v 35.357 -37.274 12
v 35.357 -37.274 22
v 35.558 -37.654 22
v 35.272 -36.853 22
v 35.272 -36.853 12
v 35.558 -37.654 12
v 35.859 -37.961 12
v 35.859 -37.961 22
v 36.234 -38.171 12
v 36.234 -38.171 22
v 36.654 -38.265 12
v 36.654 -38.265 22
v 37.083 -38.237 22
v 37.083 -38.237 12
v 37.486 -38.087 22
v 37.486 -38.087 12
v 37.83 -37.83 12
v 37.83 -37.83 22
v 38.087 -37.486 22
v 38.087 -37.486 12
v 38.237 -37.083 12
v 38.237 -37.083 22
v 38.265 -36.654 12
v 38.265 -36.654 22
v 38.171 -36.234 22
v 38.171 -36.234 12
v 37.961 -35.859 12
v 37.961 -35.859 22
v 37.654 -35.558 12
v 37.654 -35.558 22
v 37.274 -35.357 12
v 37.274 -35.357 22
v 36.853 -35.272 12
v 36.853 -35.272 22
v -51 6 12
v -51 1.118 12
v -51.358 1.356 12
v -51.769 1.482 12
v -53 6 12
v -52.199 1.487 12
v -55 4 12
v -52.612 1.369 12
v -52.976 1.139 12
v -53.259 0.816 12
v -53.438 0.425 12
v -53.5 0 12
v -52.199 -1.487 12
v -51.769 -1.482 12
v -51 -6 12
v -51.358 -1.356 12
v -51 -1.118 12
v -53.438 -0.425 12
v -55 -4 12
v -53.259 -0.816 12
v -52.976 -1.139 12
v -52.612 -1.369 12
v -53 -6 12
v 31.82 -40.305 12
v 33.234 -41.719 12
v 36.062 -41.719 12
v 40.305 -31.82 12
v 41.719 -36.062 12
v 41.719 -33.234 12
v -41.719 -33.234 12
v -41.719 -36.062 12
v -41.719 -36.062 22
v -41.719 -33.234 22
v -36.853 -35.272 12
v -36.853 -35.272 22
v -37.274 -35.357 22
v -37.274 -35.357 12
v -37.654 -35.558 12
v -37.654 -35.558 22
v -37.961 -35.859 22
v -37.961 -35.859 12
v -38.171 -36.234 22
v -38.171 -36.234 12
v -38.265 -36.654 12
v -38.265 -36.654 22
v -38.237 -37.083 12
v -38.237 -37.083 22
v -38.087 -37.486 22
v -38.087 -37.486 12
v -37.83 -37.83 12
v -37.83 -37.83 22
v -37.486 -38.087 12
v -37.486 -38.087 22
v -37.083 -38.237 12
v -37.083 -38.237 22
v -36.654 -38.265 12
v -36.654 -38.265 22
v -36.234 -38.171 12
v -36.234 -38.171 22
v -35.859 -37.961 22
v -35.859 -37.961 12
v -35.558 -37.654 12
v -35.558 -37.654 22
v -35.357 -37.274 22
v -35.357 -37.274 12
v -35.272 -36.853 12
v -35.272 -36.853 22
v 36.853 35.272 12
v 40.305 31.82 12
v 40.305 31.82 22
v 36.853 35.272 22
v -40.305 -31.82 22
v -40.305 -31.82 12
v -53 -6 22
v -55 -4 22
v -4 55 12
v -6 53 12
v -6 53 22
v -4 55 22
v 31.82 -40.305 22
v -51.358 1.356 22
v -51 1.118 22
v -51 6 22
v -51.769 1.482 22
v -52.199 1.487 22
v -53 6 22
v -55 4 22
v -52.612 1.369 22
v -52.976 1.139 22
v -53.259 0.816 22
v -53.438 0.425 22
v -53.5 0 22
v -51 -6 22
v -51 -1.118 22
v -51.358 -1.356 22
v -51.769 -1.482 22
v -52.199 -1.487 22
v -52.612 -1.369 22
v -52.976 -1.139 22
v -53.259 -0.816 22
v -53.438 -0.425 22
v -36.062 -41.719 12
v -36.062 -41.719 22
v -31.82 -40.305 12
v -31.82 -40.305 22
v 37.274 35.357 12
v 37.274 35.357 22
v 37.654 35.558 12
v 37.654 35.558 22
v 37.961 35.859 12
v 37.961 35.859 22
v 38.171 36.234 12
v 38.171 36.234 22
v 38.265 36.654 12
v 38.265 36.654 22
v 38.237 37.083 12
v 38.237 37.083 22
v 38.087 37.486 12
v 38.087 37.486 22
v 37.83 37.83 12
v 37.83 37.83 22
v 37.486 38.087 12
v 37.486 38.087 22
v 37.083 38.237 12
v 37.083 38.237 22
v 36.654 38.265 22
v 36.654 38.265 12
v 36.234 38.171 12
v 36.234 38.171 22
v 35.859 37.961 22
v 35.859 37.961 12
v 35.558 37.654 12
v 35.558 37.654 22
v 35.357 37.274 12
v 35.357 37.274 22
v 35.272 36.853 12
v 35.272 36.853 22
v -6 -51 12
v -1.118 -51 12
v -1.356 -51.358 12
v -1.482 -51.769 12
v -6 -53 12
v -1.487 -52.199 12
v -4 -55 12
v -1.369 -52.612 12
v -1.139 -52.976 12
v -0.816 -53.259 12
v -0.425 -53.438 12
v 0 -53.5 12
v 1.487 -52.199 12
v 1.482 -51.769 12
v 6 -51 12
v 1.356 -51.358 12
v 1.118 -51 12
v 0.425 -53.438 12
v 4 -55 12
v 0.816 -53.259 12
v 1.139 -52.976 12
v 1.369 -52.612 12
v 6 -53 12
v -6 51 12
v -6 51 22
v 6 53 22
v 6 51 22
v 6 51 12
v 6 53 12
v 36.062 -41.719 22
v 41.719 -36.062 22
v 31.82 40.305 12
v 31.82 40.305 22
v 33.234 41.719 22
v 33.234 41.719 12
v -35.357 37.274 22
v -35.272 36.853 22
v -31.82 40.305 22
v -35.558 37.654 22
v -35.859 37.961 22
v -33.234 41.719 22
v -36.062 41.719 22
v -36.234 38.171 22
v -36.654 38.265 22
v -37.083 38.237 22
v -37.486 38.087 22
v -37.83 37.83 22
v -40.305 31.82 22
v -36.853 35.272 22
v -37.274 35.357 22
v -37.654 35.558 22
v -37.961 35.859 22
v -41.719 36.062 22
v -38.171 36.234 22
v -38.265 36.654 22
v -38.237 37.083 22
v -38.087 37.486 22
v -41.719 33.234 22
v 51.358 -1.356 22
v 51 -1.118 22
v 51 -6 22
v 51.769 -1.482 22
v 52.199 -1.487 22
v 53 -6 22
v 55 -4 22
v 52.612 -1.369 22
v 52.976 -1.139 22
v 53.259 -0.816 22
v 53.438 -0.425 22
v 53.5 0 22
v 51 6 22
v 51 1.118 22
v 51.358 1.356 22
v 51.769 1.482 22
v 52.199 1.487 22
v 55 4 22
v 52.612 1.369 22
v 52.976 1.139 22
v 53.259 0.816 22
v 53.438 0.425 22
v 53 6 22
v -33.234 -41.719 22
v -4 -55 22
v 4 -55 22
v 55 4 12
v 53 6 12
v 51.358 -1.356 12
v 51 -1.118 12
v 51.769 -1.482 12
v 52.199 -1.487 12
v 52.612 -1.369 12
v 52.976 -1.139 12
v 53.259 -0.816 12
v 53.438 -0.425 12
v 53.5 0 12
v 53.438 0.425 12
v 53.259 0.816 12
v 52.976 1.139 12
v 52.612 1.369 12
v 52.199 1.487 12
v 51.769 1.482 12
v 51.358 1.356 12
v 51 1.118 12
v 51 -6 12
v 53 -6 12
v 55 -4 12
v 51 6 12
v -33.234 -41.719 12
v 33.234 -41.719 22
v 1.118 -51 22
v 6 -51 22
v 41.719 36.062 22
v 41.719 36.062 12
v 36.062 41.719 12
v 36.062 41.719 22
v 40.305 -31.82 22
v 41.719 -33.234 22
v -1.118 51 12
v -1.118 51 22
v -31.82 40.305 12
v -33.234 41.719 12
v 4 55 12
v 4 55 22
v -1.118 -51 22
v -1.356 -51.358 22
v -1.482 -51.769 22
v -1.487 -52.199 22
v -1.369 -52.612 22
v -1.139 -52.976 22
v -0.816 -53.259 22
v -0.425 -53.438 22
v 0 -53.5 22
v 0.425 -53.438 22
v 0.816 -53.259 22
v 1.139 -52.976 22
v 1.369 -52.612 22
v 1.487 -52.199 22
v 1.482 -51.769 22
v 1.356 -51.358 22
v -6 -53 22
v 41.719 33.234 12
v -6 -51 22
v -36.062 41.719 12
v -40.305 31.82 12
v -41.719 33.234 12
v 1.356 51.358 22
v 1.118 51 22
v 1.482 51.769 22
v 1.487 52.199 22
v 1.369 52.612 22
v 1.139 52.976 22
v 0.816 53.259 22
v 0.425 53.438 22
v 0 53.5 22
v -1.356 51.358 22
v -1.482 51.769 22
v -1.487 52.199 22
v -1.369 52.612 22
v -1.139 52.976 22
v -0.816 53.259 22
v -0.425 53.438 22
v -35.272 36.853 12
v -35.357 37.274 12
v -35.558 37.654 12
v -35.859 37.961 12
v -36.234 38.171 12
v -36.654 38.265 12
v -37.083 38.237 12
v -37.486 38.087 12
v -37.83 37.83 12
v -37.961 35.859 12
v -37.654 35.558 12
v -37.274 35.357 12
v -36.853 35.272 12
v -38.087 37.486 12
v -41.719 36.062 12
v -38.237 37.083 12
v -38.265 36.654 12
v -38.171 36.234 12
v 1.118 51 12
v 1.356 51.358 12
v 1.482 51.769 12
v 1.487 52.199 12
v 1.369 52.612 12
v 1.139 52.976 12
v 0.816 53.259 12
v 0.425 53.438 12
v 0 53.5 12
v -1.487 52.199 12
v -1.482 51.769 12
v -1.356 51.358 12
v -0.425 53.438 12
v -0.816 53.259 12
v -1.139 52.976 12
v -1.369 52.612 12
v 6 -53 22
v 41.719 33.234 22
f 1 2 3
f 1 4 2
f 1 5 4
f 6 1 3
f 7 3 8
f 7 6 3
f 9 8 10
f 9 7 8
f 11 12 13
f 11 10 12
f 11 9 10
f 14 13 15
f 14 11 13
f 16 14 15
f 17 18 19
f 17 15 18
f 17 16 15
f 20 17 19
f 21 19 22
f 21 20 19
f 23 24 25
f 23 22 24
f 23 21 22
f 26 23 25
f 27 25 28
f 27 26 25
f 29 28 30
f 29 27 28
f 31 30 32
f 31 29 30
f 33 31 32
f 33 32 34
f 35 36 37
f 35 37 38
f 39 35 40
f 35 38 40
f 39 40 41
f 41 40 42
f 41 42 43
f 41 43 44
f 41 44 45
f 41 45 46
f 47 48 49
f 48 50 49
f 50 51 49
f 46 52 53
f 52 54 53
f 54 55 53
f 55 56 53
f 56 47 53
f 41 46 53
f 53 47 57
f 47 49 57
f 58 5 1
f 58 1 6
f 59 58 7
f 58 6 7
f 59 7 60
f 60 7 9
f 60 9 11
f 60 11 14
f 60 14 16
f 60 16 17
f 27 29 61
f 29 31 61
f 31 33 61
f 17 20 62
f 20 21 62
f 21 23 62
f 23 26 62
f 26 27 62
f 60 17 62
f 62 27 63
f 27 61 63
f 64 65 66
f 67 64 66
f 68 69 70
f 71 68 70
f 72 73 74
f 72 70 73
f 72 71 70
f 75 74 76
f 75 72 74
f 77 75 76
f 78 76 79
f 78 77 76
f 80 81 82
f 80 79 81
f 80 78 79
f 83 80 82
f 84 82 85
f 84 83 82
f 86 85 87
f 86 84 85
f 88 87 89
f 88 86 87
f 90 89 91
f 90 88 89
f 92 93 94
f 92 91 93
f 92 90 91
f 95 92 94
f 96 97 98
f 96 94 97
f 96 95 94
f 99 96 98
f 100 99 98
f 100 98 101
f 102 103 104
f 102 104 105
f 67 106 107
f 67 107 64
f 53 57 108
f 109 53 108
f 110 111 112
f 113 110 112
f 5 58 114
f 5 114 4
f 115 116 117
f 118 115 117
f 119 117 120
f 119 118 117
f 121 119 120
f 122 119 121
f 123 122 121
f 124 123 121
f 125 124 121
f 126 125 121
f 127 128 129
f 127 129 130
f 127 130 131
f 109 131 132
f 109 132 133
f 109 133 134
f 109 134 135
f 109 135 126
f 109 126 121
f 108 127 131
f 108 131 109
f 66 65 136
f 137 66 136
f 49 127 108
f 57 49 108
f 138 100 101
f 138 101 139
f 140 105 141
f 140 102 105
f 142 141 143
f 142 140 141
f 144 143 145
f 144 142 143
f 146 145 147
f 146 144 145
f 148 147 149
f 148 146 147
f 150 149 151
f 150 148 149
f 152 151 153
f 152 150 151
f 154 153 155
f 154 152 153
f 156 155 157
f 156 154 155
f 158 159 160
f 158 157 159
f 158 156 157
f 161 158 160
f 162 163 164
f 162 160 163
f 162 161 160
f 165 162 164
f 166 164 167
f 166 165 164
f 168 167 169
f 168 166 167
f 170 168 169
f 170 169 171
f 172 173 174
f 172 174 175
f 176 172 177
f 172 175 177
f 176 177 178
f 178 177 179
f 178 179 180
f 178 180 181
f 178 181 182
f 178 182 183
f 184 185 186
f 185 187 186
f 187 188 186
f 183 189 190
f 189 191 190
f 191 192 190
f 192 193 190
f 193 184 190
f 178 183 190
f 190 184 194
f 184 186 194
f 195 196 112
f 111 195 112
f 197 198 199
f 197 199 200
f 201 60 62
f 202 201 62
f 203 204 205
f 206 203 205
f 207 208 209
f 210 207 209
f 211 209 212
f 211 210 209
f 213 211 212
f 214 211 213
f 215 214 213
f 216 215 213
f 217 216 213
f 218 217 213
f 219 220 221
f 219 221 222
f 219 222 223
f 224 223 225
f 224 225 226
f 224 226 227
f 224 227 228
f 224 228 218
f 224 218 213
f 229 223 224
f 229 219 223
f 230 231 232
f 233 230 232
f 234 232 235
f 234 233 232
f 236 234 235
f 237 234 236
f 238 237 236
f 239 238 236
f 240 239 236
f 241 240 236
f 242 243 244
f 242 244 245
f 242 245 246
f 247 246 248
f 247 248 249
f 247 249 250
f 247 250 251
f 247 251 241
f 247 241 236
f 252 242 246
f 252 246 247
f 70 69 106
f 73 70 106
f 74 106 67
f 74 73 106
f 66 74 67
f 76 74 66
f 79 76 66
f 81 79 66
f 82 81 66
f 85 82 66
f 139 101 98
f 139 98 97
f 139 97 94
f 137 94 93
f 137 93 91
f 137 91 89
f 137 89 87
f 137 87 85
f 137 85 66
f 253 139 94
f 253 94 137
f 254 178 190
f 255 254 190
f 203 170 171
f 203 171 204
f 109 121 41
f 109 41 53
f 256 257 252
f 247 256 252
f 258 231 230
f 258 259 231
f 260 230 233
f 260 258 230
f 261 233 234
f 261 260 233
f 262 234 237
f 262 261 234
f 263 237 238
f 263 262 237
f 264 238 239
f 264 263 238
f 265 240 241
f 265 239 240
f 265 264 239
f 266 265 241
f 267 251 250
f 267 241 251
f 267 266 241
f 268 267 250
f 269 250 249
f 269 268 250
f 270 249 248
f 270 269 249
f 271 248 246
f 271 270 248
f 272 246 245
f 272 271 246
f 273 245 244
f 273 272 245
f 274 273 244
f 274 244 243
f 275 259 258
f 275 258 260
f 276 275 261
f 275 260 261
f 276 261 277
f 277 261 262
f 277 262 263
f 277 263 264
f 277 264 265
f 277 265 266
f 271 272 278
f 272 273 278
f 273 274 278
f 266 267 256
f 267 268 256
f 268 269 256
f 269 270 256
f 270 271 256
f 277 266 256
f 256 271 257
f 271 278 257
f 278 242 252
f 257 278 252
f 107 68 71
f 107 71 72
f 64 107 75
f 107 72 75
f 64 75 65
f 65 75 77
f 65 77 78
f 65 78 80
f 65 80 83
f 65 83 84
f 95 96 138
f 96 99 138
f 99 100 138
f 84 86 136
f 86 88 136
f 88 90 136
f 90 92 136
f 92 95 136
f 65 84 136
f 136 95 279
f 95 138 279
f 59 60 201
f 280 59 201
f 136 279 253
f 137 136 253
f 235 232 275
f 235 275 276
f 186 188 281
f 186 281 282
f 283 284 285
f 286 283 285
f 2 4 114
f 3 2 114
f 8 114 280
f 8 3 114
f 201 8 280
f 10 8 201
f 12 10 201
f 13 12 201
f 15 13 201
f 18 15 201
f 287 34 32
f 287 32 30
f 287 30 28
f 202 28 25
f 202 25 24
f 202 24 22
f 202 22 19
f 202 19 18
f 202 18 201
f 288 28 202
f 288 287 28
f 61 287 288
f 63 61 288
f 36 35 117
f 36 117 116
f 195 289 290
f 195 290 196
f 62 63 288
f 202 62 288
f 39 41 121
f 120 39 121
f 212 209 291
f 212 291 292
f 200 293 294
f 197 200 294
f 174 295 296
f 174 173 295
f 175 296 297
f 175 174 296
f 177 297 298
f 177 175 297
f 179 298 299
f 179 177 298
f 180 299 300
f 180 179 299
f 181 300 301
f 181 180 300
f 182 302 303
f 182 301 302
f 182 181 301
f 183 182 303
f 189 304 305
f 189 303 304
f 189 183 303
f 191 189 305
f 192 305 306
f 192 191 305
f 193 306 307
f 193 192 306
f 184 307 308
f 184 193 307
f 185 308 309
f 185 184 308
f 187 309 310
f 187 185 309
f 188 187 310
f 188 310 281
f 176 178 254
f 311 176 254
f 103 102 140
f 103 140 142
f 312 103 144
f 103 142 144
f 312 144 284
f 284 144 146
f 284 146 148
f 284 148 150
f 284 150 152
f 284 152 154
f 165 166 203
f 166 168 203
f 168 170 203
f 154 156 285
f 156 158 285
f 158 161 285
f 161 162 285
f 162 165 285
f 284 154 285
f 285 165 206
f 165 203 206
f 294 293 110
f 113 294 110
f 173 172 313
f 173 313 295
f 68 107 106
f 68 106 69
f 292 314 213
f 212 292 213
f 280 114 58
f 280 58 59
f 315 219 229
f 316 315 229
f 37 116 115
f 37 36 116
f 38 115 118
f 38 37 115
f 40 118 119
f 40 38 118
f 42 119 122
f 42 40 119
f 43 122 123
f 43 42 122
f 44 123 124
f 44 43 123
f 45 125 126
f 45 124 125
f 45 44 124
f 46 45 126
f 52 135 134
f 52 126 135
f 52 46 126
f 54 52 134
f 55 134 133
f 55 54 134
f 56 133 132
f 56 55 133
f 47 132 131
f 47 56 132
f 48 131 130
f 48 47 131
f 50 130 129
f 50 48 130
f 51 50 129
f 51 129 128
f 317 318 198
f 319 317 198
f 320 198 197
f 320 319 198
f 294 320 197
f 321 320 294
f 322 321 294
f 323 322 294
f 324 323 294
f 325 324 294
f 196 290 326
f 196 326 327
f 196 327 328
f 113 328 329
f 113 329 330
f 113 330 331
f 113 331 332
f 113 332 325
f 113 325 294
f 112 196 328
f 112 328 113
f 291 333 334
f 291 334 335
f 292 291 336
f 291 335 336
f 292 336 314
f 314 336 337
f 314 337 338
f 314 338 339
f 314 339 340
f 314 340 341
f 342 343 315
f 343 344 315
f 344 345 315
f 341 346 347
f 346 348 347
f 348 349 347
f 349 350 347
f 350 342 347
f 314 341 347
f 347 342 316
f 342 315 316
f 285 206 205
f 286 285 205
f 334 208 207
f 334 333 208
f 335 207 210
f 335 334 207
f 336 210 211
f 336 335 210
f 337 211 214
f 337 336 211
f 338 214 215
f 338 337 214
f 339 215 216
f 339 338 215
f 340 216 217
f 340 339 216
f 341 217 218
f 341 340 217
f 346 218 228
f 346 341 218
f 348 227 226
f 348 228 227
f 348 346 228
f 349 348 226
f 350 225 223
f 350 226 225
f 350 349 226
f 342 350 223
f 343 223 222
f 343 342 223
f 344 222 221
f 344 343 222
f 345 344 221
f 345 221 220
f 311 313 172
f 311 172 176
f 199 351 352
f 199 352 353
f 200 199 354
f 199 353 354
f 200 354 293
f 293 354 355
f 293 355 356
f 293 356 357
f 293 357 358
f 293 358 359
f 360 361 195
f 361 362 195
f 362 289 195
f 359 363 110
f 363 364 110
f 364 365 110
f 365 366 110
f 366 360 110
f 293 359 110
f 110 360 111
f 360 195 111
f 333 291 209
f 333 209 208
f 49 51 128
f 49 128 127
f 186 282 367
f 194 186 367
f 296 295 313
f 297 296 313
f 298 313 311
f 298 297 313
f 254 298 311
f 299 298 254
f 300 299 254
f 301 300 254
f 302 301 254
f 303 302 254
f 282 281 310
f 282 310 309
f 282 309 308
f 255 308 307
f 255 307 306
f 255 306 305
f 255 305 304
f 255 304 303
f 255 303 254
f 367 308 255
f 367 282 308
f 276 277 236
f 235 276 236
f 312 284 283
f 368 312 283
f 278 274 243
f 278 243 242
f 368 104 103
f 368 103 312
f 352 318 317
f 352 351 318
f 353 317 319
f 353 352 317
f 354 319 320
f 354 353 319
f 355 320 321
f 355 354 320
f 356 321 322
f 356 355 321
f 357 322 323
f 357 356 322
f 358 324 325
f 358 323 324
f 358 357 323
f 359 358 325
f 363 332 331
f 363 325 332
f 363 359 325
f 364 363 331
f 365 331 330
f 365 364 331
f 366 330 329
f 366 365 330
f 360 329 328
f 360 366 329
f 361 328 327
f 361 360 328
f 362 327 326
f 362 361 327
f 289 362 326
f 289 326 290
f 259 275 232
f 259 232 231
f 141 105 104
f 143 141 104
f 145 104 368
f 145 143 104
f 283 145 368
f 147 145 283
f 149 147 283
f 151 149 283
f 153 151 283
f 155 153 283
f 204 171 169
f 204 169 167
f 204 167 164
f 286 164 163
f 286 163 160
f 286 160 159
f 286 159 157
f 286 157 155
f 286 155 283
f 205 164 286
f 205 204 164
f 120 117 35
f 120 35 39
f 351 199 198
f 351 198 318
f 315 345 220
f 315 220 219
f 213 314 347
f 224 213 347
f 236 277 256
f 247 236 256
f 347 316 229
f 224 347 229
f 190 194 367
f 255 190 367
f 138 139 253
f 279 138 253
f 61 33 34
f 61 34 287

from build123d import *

# Parameters (mm, degrees)
CYLINDER1433_R               = 1.5
CYLINDER1433_DEPTH           = 50
CYLINDER1433_PLACEMENT_ANGLE = 45
CYLINDER1431_R               = 1.5
CYLINDER1431_DEPTH           = 50
CYLINDER1438_R               = 1.5
CYLINDER1438_DEPTH           = 50
CYLINDER1438_PLACEMENT_ANGLE = 135
CYLINDER1434_R               = 1.5
CYLINDER1434_DEPTH           = 50
CYLINDER1435_R               = 1.5
CYLINDER1435_DEPTH           = 50
CYLINDER1435_PLACEMENT_ANGLE = 225
CYLINDER1436_R               = 1.5
CYLINDER1436_DEPTH           = 50
CYLINDER1437_R               = 1.5
CYLINDER1437_DEPTH           = 50
CYLINDER1437_PLACEMENT_ANGLE = 45
CYLINDER1432_R               = 1.5
CYLINDER1432_DEPTH           = 50
BOX600_W                     = 4
BOX600_H                     = 12
BOX600_DEPTH                 = 10
CHAMFER040_SIZE              = 2
CHAMFER040_PLACEMENT_ANGLE   = 45
CHAMFER041_SIZE              = 2
CHAMFER041_PLACEMENT_ANGLE   = 90
CHAMFER042_SIZE              = 2
CHAMFER042_PLACEMENT_ANGLE   = 135
CHAMFER043_SIZE              = 2
CHAMFER043_PLACEMENT_ANGLE   = 180
CHAMFER044_SIZE              = 2
CHAMFER044_PLACEMENT_ANGLE   = 225
CHAMFER045_SIZE              = 2
CHAMFER045_PLACEMENT_ANGLE   = 90
CHAMFER046_SIZE              = 2
CHAMFER046_PLACEMENT_ANGLE   = 45
CHAMFER039_SIZE              = 2


with BuildPart() as v_lec1433:
    # Cylinder1433 → Cylinder1433 (new body)
    with BuildSketch(Plane.XY):
        Circle(CYLINDER1433_R)
    extrude(amount=CYLINDER1433_DEPTH)


with BuildPart() as v_lec1433_1:
    # Cylinder1433 placement: moved
    add(v_lec1433.part.moved(Location((36.769553, 36.769553, 0))).rotate(Axis((36.769553, 36.769553, 0), (0, 0, 1)), CYLINDER1433_PLACEMENT_ANGLE))


with BuildPart() as v_lec1431:
    # Cylinder1431 → Cylinder1431 (new body)
    with BuildSketch(Plane(origin=(0, 52, 0), x_dir=(0, 1, 0), z_dir=(0, 0, 1))):
        Circle(CYLINDER1431_R)
    extrude(amount=CYLINDER1431_DEPTH)


with BuildPart() as v_lec1438:
    # Cylinder1438 → Cylinder1438 (new body)
    with BuildSketch(Plane.XY):
        Circle(CYLINDER1438_R)
    extrude(amount=CYLINDER1438_DEPTH)


with BuildPart() as v_lec1438_1:
    # Cylinder1438 placement: moved
    add(v_lec1438.part.moved(Location((-36.769553, 36.769553, 0))).rotate(Axis((-36.769553, 36.769553, 0), (0, 0, 1)), CYLINDER1438_PLACEMENT_ANGLE))


with BuildPart() as v_lec1434:
    # Cylinder1434 → Cylinder1434 (new body)
    with BuildSketch(Plane(origin=(-52, 0, 0), x_dir=(-1, 0, 0), z_dir=(0, 0, 1))):
        Circle(CYLINDER1434_R)
    extrude(amount=CYLINDER1434_DEPTH)


with BuildPart() as v_lec1435:
    # Cylinder1435 → Cylinder1435 (new body)
    with BuildSketch(Plane.XY):
        Circle(CYLINDER1435_R)
    extrude(amount=CYLINDER1435_DEPTH)


with BuildPart() as v_lec1435_1:
    # Cylinder1435 placement: moved
    add(v_lec1435.part.moved(Location((-36.769553, -36.769553, 0))).rotate(Axis((-36.769553, -36.769553, 0), (0, 0, 1)), CYLINDER1435_PLACEMENT_ANGLE))


with BuildPart() as v_lec1436:
    # Cylinder1436 → Cylinder1436 (new body)
    with BuildSketch(Plane(origin=(0, -52, 0), x_dir=(0, -1, 0), z_dir=(0, 0, 1))):
        Circle(CYLINDER1436_R)
    extrude(amount=CYLINDER1436_DEPTH)


with BuildPart() as v_lec1437:
    # Cylinder1437 → Cylinder1437 (new body)
    with BuildSketch(Plane.XY):
        Circle(CYLINDER1437_R)
    extrude(amount=CYLINDER1437_DEPTH)


with BuildPart() as v_lec1437_1:
    # Cylinder1437 placement: moved
    add(v_lec1437.part.moved(Location((36.769553, -36.769553, 0))).rotate(Axis((36.769553, -36.769553, 0), (0, 0, -1)), CYLINDER1437_PLACEMENT_ANGLE))


with BuildPart() as compound973:
    # Cylinder1432 → Cylinder1432 (new body)
    with BuildSketch(Plane(origin=(52, 0, 0), x_dir=(1, 0, 0), z_dir=(0, 0, 1))):
        Circle(CYLINDER1432_R)
    extrude(amount=CYLINDER1432_DEPTH)

    # Compound973: union Válec1433, Válec1431, Válec1438, Válec1434, Válec1435, Válec1436, Válec1437
    add(v_lec1433_1.part)
    add(v_lec1431.part)
    add(v_lec1438_1.part)
    add(v_lec1434.part)
    add(v_lec1435_1.part)
    add(v_lec1436.part)
    add(v_lec1437_1.part)


with BuildPart() as compound973_1:
    # Compound973 placement: moved
    add(compound973.part.moved(Location((0, 0, -7))))


with BuildPart() as krychle600:
    # Box600 → Box600 (new body)
    with BuildSketch(Plane(origin=(51, -6, 12), x_dir=(1, 0, 0), z_dir=(0, 0, 1))):
        with Locations((2, 6)):
            Rectangle(BOX600_W, BOX600_H)
    extrude(amount=BOX600_DEPTH)


with BuildPart() as chamfer040:
    # Chamfer040 base: copy of Krychle600
    add(krychle600.part)

    # Chamfer040
    chamfer040_edges = [chamfer040.edges().sort_by_distance(p)[0] for p in [
        (55, -6, 17),
        (55, 6, 17),
    ]]
    chamfer(chamfer040_edges, length=CHAMFER040_SIZE)


with BuildPart() as chamfer040_1:
    # Chamfer040 placement: moved
    add(chamfer040.part.rotate(Axis((0, 0, 0), (0, 0, 1)), CHAMFER040_PLACEMENT_ANGLE))


with BuildPart() as chamfer041:
    # Chamfer041 base: copy of Krychle600
    add(krychle600.part)

    # Chamfer041
    chamfer041_edges = [chamfer041.edges().sort_by_distance(p)[0] for p in [
        (55, -6, 17),
        (55, 6, 17),
    ]]
    chamfer(chamfer041_edges, length=CHAMFER041_SIZE)


with BuildPart() as chamfer041_1:
    # Chamfer041 placement: moved
    add(chamfer041.part.rotate(Axis((0, 0, 0), (0, 0, 1)), CHAMFER041_PLACEMENT_ANGLE))


with BuildPart() as chamfer042:
    # Chamfer042 base: copy of Krychle600
    add(krychle600.part)

    # Chamfer042
    chamfer042_edges = [chamfer042.edges().sort_by_distance(p)[0] for p in [
        (55, -6, 17),
        (55, 6, 17),
    ]]
    chamfer(chamfer042_edges, length=CHAMFER042_SIZE)


with BuildPart() as chamfer042_1:
    # Chamfer042 placement: moved
    add(chamfer042.part.rotate(Axis((0, 0, 0), (0, 0, 1)), CHAMFER042_PLACEMENT_ANGLE))


with BuildPart() as chamfer043:
    # Chamfer043 base: copy of Krychle600
    add(krychle600.part)

    # Chamfer043
    chamfer043_edges = [chamfer043.edges().sort_by_distance(p)[0] for p in [
        (55, -6, 17),
        (55, 6, 17),
    ]]
    chamfer(chamfer043_edges, length=CHAMFER043_SIZE)


with BuildPart() as chamfer043_1:
    # Chamfer043 placement: moved
    add(chamfer043.part.rotate(Axis((0, 0, 0), (0, 0, 1)), CHAMFER043_PLACEMENT_ANGLE))


with BuildPart() as chamfer044:
    # Chamfer044 base: copy of Krychle600
    add(krychle600.part)

    # Chamfer044
    chamfer044_edges = [chamfer044.edges().sort_by_distance(p)[0] for p in [
        (55, -6, 17),
        (55, 6, 17),
    ]]
    chamfer(chamfer044_edges, length=CHAMFER044_SIZE)


with BuildPart() as chamfer044_1:
    # Chamfer044 placement: moved
    add(chamfer044.part.rotate(Axis((0, 0, 0), (0, 0, 1)), CHAMFER044_PLACEMENT_ANGLE))


with BuildPart() as chamfer045:
    # Chamfer045 base: copy of Krychle600
    add(krychle600.part)

    # Chamfer045
    chamfer045_edges = [chamfer045.edges().sort_by_distance(p)[0] for p in [
        (55, -6, 17),
        (55, 6, 17),
    ]]
    chamfer(chamfer045_edges, length=CHAMFER045_SIZE)


with BuildPart() as chamfer045_1:
    # Chamfer045 placement: moved
    add(chamfer045.part.rotate(Axis((0, 0, 0), (0, 0, -1)), CHAMFER045_PLACEMENT_ANGLE))


with BuildPart() as chamfer046:
    # Chamfer046 base: copy of Krychle600
    add(krychle600.part)

    # Chamfer046
    chamfer046_edges = [chamfer046.edges().sort_by_distance(p)[0] for p in [
        (55, -6, 17),
        (55, 6, 17),
    ]]
    chamfer(chamfer046_edges, length=CHAMFER046_SIZE)


with BuildPart() as chamfer046_1:
    # Chamfer046 placement: moved
    add(chamfer046.part.rotate(Axis((0, 0, 0), (0, 0, -1)), CHAMFER046_PLACEMENT_ANGLE))


with BuildPart() as cut520:
    # Chamfer039 base: copy of Krychle600
    add(krychle600.part)

    # Chamfer039
    chamfer039_edges = [cut520.edges().sort_by_distance(p)[0] for p in [
        (55, -6, 17),
        (55, 6, 17),
    ]]
    chamfer(chamfer039_edges, length=CHAMFER039_SIZE)

    # Compound974: union Chamfer040, Chamfer041, Chamfer042, Chamfer043, Chamfer044, Chamfer045, Chamfer046
    add(chamfer040_1.part)
    add(chamfer041_1.part)
    add(chamfer042_1.part)
    add(chamfer043_1.part)
    add(chamfer044_1.part)
    add(chamfer045_1.part)
    add(chamfer046_1.part)

    # Cut520: cut Compound973
    add(compound973_1.part, mode=Mode.SUBTRACT)


solid = cut520.part
